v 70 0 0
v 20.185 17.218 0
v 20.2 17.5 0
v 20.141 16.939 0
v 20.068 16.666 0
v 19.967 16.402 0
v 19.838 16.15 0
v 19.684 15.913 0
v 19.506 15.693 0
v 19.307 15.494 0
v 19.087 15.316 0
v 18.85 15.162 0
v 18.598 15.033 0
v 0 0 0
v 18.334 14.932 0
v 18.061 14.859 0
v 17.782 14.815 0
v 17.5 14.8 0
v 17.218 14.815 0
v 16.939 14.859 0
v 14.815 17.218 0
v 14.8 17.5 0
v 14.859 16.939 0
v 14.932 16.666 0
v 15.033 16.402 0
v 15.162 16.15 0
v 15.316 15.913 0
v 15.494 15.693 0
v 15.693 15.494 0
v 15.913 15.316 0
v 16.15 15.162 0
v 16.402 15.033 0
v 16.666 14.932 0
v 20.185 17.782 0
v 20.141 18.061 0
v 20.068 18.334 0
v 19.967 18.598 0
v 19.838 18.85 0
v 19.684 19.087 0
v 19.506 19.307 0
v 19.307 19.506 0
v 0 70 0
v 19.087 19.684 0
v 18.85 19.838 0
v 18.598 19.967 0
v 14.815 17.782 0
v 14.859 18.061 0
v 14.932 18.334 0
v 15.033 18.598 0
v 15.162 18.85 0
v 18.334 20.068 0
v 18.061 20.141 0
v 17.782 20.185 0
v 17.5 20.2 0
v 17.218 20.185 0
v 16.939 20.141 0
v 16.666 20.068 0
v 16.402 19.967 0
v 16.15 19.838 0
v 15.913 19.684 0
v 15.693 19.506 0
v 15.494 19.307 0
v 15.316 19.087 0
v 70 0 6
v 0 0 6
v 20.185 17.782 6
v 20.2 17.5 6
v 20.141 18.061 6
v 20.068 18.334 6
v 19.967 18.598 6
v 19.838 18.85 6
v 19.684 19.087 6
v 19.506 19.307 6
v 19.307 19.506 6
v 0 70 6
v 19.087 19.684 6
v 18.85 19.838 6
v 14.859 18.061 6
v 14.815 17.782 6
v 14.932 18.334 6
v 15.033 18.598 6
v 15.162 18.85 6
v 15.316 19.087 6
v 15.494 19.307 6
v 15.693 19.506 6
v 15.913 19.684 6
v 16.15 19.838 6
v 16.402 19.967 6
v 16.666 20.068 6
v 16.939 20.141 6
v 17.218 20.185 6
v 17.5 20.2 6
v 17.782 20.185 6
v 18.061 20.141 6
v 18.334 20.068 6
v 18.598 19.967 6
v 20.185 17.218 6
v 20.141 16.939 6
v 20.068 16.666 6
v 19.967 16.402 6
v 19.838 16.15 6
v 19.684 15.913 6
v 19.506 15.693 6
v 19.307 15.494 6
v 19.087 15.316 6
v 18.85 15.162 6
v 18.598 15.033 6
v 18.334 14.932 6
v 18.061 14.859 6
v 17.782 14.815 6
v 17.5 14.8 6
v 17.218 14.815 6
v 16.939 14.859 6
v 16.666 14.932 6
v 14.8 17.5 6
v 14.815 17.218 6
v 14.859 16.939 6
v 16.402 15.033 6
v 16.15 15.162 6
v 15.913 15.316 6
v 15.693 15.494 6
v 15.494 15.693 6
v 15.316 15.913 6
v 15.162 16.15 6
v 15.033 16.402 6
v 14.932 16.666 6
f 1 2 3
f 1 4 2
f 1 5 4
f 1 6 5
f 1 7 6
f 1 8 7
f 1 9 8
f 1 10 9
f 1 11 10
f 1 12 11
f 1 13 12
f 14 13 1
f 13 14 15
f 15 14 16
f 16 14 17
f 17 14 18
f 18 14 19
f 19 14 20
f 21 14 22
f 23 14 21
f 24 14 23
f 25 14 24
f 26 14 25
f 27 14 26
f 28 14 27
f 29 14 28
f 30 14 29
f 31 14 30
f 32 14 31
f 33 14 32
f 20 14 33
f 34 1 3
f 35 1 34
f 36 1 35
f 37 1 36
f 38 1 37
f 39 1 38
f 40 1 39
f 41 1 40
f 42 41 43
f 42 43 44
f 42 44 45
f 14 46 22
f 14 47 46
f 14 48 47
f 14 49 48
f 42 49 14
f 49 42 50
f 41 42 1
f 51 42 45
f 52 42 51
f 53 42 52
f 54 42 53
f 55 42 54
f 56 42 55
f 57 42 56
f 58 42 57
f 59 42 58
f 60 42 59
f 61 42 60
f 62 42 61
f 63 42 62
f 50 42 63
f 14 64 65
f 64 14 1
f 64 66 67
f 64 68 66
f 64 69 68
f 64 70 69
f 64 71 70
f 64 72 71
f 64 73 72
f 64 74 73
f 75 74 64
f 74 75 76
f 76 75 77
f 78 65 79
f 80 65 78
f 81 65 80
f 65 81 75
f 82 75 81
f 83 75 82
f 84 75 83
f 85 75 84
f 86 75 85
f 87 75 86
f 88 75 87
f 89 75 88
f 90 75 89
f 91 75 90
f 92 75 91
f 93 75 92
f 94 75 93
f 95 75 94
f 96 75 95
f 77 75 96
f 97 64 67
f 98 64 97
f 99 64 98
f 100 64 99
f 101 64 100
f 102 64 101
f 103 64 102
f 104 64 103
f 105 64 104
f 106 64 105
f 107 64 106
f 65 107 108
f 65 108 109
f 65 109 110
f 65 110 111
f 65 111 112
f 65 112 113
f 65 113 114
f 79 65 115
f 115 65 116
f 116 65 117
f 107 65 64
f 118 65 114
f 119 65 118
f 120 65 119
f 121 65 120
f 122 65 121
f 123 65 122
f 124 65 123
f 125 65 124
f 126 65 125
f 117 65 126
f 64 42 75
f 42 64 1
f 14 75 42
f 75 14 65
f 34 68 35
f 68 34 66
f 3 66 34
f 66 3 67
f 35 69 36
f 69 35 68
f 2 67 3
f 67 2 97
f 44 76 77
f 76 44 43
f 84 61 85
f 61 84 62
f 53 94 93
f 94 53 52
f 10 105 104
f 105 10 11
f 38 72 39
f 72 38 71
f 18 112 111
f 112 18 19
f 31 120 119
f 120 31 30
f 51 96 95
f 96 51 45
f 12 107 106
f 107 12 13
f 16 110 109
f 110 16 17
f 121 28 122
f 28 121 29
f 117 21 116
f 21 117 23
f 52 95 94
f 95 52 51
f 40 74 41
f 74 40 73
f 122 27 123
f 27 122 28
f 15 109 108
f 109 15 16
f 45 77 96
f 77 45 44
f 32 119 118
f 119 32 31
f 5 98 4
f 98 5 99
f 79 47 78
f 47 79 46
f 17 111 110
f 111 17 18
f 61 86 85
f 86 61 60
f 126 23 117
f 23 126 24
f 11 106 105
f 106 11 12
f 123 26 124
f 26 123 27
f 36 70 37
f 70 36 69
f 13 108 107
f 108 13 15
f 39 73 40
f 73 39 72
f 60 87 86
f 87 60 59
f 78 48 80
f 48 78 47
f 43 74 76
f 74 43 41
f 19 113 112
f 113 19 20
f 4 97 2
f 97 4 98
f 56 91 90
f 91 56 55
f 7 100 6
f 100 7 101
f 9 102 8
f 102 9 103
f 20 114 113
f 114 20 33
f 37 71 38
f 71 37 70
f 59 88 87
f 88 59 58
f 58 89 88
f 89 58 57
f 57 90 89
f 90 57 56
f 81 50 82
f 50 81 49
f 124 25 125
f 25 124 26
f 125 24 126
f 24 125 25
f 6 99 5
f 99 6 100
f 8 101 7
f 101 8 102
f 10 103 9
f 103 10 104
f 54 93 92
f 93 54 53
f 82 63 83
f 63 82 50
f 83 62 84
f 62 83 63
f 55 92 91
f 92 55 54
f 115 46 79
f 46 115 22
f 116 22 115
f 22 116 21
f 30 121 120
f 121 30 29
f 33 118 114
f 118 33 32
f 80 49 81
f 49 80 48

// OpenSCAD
// Triangular reinforcement gusset.
$fn = 60;
eps = 0.02;
leg = 70;
thickness = 6;
difference() {
    linear_extrude(height=thickness) polygon(points=[[0,0],[leg,0],[0,leg]]);
    translate([leg*0.25,leg*0.25,-eps]) cylinder(d=5.4,h=thickness+2*eps);
}
